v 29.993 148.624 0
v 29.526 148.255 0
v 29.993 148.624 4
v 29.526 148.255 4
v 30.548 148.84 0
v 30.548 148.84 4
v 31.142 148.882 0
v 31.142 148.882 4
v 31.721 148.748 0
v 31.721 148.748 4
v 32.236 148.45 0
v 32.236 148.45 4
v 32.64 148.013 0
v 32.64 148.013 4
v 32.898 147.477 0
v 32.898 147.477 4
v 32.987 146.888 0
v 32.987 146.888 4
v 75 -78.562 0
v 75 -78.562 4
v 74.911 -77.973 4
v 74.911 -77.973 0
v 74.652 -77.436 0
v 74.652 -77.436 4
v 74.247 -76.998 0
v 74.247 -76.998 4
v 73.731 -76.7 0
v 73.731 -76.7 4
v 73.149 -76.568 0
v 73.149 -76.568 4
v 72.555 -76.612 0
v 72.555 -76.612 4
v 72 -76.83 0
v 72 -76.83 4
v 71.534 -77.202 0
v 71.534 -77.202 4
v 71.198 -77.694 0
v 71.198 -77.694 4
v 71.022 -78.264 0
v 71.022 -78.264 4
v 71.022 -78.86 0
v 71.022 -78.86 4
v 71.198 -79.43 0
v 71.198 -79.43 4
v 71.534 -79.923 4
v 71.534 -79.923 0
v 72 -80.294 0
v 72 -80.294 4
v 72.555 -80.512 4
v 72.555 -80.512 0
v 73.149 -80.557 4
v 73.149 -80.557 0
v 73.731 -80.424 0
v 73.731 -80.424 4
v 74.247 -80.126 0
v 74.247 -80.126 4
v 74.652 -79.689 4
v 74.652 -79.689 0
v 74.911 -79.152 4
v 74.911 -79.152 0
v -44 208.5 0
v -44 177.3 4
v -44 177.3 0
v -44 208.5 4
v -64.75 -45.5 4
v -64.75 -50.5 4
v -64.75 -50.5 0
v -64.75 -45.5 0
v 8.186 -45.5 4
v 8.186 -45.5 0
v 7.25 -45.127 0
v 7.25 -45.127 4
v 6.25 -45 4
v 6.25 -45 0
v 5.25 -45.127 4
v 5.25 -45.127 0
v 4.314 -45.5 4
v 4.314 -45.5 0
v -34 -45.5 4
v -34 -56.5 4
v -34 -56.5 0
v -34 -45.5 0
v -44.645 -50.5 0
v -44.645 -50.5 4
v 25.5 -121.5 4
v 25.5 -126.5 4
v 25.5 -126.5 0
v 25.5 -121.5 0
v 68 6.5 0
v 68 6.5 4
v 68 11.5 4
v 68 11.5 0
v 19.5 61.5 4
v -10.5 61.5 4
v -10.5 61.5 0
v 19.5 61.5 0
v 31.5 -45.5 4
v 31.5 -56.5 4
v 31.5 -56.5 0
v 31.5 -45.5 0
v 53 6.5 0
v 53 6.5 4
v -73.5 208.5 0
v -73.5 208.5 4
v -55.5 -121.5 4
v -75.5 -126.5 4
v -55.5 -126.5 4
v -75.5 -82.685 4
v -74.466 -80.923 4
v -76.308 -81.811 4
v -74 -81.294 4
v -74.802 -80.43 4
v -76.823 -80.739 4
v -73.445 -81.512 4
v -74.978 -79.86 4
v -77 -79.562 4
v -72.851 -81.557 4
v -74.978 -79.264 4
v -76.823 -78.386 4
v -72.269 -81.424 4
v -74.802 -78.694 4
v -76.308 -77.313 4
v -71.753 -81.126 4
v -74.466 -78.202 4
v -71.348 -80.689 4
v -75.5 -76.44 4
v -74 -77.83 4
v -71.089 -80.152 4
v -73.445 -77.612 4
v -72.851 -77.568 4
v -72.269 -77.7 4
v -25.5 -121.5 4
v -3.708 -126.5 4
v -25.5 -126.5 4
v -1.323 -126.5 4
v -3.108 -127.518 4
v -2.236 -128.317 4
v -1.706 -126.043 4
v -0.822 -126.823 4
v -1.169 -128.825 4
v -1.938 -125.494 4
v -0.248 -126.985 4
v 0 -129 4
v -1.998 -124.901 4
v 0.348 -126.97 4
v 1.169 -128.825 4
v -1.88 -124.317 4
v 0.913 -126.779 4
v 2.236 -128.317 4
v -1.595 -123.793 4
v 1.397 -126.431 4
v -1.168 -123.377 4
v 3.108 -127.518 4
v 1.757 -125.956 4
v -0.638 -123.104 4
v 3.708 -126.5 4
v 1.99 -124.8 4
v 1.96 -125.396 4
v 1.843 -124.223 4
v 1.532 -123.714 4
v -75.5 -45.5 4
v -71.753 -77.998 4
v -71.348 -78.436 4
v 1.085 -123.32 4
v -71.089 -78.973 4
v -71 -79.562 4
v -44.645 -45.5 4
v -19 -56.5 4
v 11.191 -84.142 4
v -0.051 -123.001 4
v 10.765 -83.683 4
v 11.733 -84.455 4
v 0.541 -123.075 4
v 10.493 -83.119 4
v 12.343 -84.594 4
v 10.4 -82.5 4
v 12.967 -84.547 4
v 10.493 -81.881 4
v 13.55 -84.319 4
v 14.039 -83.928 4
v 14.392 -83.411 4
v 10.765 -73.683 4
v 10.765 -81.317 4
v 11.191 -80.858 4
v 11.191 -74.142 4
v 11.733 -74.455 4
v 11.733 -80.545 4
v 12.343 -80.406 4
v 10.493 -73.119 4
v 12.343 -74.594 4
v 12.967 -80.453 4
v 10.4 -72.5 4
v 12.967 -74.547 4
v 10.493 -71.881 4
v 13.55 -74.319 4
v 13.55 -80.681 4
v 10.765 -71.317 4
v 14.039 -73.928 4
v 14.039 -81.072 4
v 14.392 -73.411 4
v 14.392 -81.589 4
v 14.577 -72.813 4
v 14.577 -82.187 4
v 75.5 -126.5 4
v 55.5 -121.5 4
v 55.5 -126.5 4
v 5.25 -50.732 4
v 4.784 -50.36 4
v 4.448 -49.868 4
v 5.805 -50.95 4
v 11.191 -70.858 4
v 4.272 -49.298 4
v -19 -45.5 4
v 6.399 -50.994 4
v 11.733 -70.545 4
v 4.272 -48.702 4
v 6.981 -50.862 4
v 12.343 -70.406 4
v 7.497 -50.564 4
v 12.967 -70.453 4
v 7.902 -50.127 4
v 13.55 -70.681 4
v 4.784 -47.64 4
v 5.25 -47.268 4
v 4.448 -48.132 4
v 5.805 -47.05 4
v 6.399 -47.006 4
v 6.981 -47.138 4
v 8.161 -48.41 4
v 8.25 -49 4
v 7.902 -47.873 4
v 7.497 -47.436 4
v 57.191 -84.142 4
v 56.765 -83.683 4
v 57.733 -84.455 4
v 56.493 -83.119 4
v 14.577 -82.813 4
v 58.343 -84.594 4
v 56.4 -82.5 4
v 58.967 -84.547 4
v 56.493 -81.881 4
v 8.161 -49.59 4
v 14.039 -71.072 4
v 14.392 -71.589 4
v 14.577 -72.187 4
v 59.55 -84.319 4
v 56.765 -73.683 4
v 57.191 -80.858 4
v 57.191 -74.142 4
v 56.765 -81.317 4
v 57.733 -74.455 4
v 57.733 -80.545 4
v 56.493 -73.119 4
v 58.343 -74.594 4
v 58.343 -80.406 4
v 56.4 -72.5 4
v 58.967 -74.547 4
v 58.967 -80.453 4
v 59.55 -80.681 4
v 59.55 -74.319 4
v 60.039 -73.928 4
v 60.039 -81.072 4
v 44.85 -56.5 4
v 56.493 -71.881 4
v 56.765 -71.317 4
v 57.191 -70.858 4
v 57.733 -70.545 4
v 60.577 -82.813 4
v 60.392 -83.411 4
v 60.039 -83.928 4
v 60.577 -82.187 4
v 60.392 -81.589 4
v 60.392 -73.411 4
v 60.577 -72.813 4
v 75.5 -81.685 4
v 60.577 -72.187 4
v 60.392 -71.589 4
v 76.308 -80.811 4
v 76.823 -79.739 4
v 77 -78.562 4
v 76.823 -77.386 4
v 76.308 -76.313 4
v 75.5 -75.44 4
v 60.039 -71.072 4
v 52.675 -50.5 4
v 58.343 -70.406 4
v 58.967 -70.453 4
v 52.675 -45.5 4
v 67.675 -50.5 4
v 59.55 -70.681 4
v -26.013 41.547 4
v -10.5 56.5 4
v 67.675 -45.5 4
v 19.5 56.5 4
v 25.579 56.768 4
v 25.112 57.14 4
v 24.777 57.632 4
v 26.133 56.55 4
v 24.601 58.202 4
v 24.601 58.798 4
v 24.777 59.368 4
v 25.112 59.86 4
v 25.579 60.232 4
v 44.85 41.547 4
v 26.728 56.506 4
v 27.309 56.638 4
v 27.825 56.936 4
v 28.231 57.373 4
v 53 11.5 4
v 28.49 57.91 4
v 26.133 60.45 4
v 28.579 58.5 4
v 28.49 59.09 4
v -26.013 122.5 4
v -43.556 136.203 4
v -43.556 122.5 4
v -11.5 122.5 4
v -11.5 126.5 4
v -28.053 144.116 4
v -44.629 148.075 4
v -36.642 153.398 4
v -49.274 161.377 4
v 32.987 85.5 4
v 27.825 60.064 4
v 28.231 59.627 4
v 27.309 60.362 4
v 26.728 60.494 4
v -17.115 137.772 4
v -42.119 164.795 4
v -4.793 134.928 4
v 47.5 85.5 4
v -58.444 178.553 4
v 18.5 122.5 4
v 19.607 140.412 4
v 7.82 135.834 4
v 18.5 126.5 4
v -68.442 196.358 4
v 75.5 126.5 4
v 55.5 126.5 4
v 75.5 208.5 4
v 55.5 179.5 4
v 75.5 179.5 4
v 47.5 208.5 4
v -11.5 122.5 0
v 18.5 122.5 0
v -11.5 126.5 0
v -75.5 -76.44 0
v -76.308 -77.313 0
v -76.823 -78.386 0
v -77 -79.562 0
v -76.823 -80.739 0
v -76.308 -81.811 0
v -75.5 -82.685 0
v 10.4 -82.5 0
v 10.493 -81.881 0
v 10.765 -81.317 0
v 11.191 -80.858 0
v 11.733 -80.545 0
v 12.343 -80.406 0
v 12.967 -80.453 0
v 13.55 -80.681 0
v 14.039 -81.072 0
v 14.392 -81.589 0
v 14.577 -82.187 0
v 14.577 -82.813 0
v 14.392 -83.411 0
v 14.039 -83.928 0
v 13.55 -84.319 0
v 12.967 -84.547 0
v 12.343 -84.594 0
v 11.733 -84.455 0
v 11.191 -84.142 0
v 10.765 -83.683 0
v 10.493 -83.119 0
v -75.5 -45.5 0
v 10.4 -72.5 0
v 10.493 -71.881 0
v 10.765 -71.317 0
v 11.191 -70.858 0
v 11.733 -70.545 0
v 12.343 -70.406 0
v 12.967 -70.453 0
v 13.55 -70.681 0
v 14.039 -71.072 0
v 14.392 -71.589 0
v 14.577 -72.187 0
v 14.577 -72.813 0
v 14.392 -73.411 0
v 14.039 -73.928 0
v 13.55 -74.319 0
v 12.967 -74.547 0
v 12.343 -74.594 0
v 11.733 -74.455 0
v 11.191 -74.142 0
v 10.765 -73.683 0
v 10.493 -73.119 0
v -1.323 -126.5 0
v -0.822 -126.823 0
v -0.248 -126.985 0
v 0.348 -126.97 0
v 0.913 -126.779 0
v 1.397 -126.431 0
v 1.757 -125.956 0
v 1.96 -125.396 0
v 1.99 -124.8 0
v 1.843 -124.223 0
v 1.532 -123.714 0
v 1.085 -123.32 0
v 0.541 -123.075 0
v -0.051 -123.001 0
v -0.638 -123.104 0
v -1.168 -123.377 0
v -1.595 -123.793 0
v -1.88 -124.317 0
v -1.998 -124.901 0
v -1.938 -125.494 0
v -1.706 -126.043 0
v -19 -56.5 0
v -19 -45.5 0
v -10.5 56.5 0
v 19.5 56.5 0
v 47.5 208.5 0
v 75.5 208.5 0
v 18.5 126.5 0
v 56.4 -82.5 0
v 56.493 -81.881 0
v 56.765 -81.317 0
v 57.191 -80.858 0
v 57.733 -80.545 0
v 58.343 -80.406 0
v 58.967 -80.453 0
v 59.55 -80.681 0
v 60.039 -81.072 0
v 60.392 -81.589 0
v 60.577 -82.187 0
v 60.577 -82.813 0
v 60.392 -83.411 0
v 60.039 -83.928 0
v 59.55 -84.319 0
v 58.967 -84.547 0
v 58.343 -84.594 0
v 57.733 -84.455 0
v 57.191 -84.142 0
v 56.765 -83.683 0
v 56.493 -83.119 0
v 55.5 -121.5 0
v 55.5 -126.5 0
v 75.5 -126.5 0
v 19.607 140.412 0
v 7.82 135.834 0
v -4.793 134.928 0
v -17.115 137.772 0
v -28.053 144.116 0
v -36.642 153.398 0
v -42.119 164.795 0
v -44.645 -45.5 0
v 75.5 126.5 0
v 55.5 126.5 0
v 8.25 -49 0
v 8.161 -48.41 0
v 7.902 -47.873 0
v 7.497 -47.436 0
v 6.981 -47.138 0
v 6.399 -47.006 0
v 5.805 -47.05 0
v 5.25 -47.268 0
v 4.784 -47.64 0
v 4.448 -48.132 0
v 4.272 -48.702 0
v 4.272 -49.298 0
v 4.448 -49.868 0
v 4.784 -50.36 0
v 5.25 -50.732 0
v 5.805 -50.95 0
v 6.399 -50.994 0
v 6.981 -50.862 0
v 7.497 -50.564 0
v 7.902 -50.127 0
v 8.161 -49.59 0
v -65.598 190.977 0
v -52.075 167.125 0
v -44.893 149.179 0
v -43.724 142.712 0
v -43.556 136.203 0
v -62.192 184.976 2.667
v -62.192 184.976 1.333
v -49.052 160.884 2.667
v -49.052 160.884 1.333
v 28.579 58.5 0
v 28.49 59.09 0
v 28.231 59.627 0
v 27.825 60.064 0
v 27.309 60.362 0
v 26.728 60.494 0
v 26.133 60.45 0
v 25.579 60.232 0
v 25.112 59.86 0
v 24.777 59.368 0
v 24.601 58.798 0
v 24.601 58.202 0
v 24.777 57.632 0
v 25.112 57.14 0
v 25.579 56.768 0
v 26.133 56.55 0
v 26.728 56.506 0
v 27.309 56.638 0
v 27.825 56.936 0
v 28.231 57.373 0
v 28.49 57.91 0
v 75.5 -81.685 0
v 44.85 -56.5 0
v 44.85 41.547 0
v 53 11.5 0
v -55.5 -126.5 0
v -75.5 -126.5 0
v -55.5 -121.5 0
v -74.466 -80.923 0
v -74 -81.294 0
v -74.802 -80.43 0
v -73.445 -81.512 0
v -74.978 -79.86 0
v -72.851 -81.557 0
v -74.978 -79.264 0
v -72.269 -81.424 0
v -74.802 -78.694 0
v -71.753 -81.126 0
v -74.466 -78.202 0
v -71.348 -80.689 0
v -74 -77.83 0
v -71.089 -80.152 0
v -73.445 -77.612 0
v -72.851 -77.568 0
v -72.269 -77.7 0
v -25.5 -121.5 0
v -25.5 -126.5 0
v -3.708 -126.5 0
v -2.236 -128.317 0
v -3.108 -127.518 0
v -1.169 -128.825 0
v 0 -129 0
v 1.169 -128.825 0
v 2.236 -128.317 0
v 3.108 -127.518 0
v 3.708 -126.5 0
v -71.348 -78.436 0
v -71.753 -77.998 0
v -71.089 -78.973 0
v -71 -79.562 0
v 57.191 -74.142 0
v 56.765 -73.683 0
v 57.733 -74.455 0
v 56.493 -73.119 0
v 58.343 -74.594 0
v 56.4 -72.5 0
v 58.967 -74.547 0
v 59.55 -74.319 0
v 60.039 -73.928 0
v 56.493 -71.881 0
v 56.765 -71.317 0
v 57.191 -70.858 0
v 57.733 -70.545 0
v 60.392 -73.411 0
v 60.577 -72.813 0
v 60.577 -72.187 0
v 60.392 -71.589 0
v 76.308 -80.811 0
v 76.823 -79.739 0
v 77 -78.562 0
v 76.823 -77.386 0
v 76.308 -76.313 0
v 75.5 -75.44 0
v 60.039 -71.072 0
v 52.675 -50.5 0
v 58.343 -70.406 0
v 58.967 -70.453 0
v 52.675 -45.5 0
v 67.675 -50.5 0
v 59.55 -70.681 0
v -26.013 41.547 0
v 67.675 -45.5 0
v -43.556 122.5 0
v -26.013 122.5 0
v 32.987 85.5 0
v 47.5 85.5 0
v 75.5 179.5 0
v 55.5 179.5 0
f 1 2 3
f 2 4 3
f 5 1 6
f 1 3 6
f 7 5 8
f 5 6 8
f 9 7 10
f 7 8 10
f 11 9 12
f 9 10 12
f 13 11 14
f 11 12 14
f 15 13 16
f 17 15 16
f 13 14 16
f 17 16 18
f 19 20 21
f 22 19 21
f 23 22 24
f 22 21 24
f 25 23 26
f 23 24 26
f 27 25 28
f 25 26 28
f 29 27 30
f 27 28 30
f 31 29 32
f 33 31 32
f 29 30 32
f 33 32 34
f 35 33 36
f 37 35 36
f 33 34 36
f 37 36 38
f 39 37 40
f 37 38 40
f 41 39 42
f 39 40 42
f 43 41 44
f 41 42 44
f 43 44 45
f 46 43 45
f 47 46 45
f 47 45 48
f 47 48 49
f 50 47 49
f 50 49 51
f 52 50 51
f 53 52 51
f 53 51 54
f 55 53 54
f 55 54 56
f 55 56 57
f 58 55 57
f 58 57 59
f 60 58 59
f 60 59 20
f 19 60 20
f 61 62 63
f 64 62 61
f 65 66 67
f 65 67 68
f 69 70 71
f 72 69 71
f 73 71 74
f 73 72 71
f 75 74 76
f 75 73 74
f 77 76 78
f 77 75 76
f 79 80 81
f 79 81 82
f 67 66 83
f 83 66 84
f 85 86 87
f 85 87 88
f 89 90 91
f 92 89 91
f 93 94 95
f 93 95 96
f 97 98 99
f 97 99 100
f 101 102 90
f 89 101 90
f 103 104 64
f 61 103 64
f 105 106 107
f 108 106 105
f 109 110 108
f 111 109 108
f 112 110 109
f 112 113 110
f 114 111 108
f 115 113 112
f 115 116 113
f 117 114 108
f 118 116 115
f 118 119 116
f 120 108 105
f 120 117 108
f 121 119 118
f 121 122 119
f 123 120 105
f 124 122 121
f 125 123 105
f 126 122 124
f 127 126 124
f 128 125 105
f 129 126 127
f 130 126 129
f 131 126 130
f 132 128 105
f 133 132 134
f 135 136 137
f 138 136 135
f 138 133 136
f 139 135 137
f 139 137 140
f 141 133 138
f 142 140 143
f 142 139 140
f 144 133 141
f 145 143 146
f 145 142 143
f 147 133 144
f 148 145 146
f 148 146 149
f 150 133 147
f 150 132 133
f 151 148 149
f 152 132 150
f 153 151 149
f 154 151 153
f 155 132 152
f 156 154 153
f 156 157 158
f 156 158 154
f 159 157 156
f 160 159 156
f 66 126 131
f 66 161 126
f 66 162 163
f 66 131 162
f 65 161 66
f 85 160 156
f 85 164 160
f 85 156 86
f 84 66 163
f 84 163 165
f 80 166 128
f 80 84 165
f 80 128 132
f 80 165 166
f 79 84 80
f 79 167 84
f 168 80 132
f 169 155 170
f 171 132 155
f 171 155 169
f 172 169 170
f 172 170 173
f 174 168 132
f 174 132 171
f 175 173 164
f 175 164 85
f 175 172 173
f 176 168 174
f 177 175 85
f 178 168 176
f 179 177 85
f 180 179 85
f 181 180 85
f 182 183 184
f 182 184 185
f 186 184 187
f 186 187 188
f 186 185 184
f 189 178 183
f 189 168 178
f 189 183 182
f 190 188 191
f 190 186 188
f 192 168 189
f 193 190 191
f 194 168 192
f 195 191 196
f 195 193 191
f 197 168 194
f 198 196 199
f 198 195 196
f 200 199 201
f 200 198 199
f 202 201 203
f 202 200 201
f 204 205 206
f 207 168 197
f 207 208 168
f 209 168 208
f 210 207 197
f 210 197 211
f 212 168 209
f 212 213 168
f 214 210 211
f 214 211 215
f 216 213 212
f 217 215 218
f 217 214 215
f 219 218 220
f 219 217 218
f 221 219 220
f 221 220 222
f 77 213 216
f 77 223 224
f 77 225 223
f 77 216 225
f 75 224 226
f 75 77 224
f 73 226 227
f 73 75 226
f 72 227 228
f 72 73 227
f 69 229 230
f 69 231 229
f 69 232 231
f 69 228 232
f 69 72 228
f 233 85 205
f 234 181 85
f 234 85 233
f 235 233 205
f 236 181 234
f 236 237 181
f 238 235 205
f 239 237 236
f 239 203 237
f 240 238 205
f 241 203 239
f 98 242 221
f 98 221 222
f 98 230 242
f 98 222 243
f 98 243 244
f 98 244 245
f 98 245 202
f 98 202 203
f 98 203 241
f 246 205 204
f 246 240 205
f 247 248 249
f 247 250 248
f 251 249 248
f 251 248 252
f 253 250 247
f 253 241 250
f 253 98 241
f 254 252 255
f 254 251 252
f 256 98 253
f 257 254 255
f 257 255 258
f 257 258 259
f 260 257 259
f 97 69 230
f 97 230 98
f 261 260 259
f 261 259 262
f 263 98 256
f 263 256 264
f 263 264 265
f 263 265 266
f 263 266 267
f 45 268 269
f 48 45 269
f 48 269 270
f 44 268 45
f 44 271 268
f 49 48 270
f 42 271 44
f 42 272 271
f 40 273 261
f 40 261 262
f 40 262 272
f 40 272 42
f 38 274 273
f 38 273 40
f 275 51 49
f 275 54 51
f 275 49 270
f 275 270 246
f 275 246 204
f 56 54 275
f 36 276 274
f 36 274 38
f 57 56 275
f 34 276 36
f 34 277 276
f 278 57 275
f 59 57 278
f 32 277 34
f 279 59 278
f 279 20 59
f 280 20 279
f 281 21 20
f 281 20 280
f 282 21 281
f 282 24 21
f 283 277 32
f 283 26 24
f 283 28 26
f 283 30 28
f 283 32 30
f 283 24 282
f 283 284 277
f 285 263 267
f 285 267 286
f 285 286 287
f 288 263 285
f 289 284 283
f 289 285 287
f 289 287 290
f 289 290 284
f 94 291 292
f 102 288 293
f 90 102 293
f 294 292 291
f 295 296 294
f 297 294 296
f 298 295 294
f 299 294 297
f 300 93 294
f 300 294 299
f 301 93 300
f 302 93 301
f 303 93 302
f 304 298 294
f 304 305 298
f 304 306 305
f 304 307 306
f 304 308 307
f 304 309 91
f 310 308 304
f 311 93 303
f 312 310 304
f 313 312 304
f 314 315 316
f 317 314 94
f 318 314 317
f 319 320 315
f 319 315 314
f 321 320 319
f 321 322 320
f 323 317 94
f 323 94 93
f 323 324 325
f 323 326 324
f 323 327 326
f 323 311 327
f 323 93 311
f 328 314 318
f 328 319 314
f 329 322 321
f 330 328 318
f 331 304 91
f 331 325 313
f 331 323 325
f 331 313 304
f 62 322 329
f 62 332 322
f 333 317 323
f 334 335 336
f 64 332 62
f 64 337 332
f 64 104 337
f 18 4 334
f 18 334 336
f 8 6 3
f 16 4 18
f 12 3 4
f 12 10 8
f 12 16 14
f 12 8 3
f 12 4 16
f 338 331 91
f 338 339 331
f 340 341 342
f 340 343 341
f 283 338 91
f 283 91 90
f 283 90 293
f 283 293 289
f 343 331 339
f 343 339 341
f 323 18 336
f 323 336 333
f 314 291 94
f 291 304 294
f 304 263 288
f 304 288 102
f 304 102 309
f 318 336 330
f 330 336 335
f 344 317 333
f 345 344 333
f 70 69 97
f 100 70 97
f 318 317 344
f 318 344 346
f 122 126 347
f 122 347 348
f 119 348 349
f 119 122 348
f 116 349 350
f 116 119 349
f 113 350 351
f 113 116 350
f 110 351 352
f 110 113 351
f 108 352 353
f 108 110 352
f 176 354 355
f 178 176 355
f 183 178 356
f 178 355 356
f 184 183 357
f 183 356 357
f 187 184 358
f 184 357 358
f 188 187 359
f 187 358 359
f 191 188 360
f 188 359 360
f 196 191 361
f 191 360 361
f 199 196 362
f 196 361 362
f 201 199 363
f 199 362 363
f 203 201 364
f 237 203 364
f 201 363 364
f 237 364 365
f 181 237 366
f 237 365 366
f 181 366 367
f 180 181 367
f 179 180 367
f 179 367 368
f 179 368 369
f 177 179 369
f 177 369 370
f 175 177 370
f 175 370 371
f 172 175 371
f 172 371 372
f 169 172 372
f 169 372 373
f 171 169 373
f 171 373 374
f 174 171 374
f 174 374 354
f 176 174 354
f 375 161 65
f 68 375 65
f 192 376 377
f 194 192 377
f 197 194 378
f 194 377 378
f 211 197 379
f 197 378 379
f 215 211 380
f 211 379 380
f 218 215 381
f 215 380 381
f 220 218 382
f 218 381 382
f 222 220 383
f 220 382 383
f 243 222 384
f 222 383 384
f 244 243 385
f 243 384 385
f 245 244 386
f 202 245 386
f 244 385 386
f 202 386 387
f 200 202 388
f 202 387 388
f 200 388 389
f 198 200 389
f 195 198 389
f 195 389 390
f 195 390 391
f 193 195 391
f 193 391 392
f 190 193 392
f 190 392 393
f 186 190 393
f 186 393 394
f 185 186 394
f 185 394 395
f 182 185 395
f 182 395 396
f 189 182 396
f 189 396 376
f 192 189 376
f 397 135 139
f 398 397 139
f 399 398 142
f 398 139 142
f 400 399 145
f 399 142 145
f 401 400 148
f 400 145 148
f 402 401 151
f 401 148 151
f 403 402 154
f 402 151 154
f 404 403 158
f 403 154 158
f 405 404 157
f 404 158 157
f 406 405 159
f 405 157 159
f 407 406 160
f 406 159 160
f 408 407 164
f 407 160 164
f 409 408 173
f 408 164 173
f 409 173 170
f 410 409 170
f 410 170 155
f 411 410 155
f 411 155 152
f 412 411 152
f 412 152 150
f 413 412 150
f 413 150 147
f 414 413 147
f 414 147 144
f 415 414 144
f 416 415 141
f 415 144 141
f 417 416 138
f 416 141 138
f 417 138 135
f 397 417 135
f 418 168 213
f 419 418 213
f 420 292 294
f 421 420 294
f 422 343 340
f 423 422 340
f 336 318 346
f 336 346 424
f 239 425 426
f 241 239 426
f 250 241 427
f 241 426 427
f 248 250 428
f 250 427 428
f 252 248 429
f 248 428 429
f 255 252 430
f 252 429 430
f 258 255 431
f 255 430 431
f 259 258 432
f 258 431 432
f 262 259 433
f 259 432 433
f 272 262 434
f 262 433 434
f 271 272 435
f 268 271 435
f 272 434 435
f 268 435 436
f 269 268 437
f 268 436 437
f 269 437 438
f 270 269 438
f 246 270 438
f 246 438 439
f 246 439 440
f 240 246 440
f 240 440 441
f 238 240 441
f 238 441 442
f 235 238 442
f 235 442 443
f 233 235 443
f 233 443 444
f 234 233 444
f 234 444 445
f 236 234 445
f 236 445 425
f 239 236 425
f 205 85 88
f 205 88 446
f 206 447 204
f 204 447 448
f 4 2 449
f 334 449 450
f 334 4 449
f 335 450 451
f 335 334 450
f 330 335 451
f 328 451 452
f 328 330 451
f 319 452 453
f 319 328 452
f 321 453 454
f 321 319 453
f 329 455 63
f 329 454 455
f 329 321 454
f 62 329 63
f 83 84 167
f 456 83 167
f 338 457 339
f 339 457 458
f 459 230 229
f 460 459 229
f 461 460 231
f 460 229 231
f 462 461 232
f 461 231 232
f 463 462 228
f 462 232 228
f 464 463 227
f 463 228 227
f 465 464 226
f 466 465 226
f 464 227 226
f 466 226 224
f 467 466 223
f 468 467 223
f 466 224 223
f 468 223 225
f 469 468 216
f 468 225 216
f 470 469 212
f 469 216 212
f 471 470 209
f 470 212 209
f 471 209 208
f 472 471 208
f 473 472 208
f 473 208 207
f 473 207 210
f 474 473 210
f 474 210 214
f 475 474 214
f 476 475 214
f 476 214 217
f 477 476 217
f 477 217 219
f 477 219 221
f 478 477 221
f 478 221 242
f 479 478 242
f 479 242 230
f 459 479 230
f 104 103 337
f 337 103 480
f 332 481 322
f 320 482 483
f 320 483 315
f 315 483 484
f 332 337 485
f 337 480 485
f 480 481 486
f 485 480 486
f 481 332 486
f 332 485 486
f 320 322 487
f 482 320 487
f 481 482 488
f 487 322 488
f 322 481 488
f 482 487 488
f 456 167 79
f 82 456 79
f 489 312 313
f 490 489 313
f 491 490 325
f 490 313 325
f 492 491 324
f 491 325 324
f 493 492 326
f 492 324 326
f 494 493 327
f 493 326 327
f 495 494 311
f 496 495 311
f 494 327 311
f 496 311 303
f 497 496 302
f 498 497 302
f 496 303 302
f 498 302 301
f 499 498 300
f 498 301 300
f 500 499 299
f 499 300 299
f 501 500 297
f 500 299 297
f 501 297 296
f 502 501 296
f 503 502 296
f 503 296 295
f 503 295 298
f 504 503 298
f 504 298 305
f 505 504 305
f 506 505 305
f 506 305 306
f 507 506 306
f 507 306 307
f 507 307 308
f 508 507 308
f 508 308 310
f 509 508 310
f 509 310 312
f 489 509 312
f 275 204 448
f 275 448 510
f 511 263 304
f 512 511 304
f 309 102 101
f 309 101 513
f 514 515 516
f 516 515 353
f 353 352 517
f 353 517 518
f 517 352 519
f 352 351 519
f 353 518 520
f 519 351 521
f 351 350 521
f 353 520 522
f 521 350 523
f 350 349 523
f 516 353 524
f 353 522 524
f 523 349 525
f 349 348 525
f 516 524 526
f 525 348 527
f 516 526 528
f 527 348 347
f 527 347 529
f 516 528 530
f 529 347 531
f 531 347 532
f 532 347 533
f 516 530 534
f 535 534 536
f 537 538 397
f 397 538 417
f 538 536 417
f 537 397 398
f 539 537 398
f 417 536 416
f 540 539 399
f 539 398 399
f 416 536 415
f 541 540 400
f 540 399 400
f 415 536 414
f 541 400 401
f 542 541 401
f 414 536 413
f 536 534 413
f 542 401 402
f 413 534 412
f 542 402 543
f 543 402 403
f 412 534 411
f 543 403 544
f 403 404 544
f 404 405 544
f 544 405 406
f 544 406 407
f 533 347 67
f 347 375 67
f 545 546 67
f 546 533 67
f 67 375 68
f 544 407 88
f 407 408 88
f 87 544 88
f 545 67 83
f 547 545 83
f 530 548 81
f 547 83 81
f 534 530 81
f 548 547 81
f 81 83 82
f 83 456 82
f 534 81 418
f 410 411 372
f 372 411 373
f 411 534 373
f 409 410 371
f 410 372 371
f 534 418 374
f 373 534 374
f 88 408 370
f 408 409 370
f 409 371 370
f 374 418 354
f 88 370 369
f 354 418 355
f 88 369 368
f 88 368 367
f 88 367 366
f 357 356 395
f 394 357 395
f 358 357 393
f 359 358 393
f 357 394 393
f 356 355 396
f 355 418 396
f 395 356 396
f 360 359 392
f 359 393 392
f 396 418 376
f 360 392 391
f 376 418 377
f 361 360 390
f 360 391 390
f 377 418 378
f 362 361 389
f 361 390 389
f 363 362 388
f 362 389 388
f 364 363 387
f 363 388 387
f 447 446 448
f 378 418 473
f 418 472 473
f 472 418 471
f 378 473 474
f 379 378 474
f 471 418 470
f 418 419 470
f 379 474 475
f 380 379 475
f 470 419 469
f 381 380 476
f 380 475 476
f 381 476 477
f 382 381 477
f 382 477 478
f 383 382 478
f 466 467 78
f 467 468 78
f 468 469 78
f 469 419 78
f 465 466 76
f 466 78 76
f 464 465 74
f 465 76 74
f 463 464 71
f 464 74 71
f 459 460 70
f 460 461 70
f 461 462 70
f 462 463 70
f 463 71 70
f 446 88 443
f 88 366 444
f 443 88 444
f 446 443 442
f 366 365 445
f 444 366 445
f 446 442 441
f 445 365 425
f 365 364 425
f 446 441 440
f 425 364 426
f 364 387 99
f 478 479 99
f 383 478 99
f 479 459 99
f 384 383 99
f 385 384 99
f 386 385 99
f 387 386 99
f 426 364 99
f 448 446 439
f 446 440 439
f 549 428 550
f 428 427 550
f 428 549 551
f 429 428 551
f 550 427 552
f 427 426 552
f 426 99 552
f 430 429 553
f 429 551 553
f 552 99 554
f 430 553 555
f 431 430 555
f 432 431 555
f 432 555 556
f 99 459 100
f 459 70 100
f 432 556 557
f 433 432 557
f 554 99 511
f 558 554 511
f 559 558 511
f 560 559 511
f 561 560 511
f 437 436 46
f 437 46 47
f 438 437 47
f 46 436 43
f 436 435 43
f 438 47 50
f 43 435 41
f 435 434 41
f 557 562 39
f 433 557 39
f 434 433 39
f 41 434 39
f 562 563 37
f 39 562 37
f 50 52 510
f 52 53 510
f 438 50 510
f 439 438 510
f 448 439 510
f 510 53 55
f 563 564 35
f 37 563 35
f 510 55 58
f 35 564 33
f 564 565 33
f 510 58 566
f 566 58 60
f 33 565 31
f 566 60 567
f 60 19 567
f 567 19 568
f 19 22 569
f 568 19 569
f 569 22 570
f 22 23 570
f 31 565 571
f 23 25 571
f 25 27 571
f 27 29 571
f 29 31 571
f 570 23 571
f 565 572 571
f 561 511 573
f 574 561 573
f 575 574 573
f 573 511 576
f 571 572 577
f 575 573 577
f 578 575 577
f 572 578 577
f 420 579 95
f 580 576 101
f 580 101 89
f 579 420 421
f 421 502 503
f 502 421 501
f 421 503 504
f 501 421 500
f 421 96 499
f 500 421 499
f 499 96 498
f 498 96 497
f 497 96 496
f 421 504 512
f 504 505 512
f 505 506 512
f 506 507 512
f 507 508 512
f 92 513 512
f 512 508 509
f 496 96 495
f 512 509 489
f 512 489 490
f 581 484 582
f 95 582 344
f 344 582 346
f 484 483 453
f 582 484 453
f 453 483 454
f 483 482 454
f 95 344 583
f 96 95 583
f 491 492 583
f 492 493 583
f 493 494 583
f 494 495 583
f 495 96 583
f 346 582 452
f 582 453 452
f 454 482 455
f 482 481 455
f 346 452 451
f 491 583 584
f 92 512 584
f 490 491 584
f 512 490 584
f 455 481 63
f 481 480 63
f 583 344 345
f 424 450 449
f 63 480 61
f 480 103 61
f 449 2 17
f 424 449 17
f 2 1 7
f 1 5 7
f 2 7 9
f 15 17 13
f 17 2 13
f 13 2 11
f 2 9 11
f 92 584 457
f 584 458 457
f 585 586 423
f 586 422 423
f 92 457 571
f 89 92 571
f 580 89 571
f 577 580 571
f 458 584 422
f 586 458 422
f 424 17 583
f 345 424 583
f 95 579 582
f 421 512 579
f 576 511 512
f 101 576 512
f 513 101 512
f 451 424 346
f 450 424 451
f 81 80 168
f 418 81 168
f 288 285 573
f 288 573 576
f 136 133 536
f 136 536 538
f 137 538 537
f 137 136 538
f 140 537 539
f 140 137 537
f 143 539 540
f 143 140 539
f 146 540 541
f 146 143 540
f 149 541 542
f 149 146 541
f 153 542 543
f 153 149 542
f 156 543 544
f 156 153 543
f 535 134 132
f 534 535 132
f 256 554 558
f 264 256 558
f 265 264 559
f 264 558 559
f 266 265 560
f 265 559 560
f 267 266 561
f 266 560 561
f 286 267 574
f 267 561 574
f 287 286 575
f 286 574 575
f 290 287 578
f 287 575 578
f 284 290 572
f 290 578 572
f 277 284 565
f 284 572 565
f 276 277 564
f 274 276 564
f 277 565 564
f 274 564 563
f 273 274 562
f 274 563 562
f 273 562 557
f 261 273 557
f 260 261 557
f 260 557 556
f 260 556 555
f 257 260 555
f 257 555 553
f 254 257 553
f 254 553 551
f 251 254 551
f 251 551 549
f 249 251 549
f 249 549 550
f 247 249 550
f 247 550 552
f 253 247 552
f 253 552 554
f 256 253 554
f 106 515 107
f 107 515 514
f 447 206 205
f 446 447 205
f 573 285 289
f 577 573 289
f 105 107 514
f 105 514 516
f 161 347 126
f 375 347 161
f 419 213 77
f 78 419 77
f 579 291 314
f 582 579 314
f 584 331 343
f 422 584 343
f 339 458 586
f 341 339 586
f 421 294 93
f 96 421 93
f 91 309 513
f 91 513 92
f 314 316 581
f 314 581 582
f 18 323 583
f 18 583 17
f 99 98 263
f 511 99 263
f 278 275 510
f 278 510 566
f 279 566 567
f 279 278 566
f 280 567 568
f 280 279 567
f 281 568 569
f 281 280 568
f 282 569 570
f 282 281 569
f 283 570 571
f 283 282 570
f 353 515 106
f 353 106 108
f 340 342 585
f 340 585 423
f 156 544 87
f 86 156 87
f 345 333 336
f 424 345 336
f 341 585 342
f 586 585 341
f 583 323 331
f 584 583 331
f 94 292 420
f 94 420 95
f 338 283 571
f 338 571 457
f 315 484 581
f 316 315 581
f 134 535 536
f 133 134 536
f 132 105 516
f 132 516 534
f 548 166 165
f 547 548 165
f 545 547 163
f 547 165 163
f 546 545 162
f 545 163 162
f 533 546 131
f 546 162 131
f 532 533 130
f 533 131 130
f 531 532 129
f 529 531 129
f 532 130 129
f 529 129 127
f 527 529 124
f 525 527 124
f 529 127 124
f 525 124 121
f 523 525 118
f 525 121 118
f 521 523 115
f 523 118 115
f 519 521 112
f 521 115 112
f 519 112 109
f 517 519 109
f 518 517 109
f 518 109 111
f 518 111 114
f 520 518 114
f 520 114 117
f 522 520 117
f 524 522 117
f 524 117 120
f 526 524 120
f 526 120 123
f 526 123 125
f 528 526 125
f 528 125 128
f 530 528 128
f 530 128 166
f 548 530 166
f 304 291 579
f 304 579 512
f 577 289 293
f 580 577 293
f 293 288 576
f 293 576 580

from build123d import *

# Parameters (mm, degrees)
SKETCH1_W           = 151
SKETCH1_H           = 254
BOSS_EXTRUDE1_DEPTH = 4
SKETCH2_W           = 49.486524855
SKETCH2_H           = 99.222786378
CUT_EXTRUDE1_DEPTH  = 5
SKETCH4_W           = 120.35
SKETCH4_H           = 88.04721362
CUT_EXTRUDE3_DEPTH  = 5
SKETCH6_R           = 2
CUT_EXTRUDE5_DEPTH  = 10
SKETCH12_W          = 15
SKETCH12_H          = 10
SKETCH12_W_2        = 13.35
CUT_EXTRUDE8_DEPTH  = 10
SKETCH13_R          = 2
CUT_EXTRUDE9_DEPTH  = 5
SKETCH14_R          = 4
SKETCH14_R_2        = 2
BOSS_EXTRUDE2_DEPTH = 4
SKETCH15_R          = 2.1
CUT_EXTRUDE10_DEPTH = 10
SKETCH18_R          = 2
CUT_EXTRUDE12_DEPTH = 5
SKETCH19_R          = 4
SKETCH19_R_2        = 2
BOSS_EXTRUDE3_DEPTH = 4
SKETCH25_W          = 59.513475145
SKETCH25_H          = 4
CUT_EXTRUDE16_DEPTH = 10
SKETCH26_W          = 151
SKETCH26_H          = 86
BOSS_EXTRUDE4_DEPTH = 4
SKETCH27_W          = 42
SKETCH27_H          = 62
BOSS_EXTRUDE5_DEPTH = 4
CUT_EXTRUDE17_DEPTH = 5
SKETCH29_W          = 20
SKETCH29_H          = 53
CUT_EXTRUDE18_DEPTH = 10
SKETCH30_W          = 14.513475145
SKETCH30_H          = 123
CUT_EXTRUDE19_DEPTH = 10
CUT_EXTRUDE20_DEPTH = 10
FILLET1_R           = 2
SKETCH33_W          = 30
SKETCH33_H          = 4
CUT_EXTRUDE22_DEPTH = 10
SKETCH34_W          = 30
SKETCH34_H          = 5
SKETCH34_W_2        = 15
CUT_EXTRUDE23_DEPTH = 10
SKETCH35_W          = 50.5
SKETCH35_H          = 0.999999998
SKETCH35_W_2        = 41.5
BOSS_EXTRUDE6_DEPTH = 4
SKETCH36_W          = 20.104648663
SKETCH36_H          = 5
CUT_EXTRUDE24_DEPTH = 5
SKETCH37_R          = 2
CUT_EXTRUDE25_DEPTH = 5
SKETCH38_R          = 4
SKETCH38_R_2        = 2
BOSS_EXTRUDE7_DEPTH = 4
SKETCH39_R          = 2
CUT_EXTRUDE26_DEPTH = 10


with BuildPart() as part:
    # Sketch1 → Boss-Extrude1 (new body)
    with BuildSketch(Plane.XY):
        with Locations((0, 0.5)):
            Rectangle(SKETCH1_W, SKETCH1_H)
    extrude(amount=BOSS_EXTRUDE1_DEPTH)

    # Sketch2 → Cut-Extrude1 (cut)
    with BuildSketch(Plane.XY.offset(4)):
        with Locations((-50.756737573, 77.888606811)):
            Rectangle(SKETCH2_W, SKETCH2_H)
    extrude(amount=-CUT_EXTRUDE1_DEPTH, mode=Mode.SUBTRACT)

    # Sketch4 → Cut-Extrude3 (cut)
    with BuildSketch(Plane.XY.offset(4)):
        with Locations((-15.325, -2.476393188)):
            Rectangle(SKETCH4_W, SKETCH4_H)
    extrude(amount=-CUT_EXTRUDE3_DEPTH, mode=Mode.SUBTRACT)

    # Sketch6 → Cut-Extrude5 (cut)
    with BuildSketch(Plane.XY.offset(4)):
        with Locations((0, -125)):
            Circle(SKETCH6_R)
    extrude(amount=-CUT_EXTRUDE5_DEPTH, mode=Mode.SUBTRACT)

    # Sketch12 → Cut-Extrude8 (cut)
    with BuildSketch(Plane.XY.offset(4)):
        with Locations((-26.5, -51.499999998)):
            Rectangle(SKETCH12_W, SKETCH12_H)
        with Locations((38.175, -51.499999998)):
            Rectangle(SKETCH12_W_2, SKETCH12_H)
    extrude(amount=-CUT_EXTRUDE8_DEPTH, mode=Mode.SUBTRACT)

    # Sketch13 → Cut-Extrude9 (cut)
    with BuildSketch(Plane.XY.offset(4)):
        with Locations((6.25, -49)):
            Circle(SKETCH13_R)
    extrude(amount=-CUT_EXTRUDE9_DEPTH, mode=Mode.SUBTRACT)

    # Sketch14 → Boss-Extrude2 (add)
    # profile 1 of 2: a face of its own
    with BuildSketch(Plane.XY.offset(4)):
        with Locations((6.25, -49)):
            Circle(SKETCH14_R)
        with Locations((6.25, -49)):
            Circle(SKETCH14_R_2, mode=Mode.SUBTRACT)
    # profile 2 of 2: a face of its own
    with BuildSketch(Plane.XY.offset(4)):
        with Locations((0, -125)):
            Circle(SKETCH14_R)
        with Locations((0, -125)):
            Circle(SKETCH14_R_2, mode=Mode.SUBTRACT)
    extrude(amount=-BOSS_EXTRUDE2_DEPTH)

    # Sketch15 → Cut-Extrude10 (cut)
    with BuildSketch(Plane(origin=(0, 0, 0), x_dir=(-1, 0, 0), z_dir=(0, 0, -1))):
        with Locations((-58.5, -72.5)):
            Circle(SKETCH15_R)
        with Locations((-58.5, -82.5)):
            Circle(SKETCH15_R)
        with Locations((-12.5, -72.5)):
            Circle(SKETCH15_R)
        with Locations((-12.5, -82.5)):
            Circle(SKETCH15_R)
    extrude(amount=-CUT_EXTRUDE10_DEPTH, mode=Mode.SUBTRACT)

    # Sketch18 → Cut-Extrude12 (cut)
    with BuildSketch(Plane.XY.offset(4)):
        with Locations((-73, -79.562158061)):
            Circle(SKETCH18_R)
    extrude(amount=-CUT_EXTRUDE12_DEPTH, mode=Mode.SUBTRACT)

    # Sketch19 → Boss-Extrude3 (add)
    with BuildSketch(Plane.XY.offset(4)):
        with Locations((-73, -79.562158061)):
            Circle(SKETCH19_R)
        with Locations((-73, -79.562158061)):
            Circle(SKETCH19_R_2, mode=Mode.SUBTRACT)
    extrude(amount=-BOSS_EXTRUDE3_DEPTH)

    # Sketch25 → Cut-Extrude16 (cut)
    with BuildSketch(Plane.XY.offset(4)):
        with Locations((3.743262427, 124.5)):
            Rectangle(SKETCH25_W, SKETCH25_H)
    extrude(amount=-CUT_EXTRUDE16_DEPTH, mode=Mode.SUBTRACT)

    # Sketch26 → Boss-Extrude4 (add)
    with BuildSketch(Plane.XY.offset(4)):
        with Locations((0, 165.5)):
            Rectangle(SKETCH26_W, SKETCH26_H)
    extrude(amount=-BOSS_EXTRUDE4_DEPTH)

    # Sketch27 → Boss-Extrude5 (add)
    with BuildSketch(Plane.XY.offset(4)):
        with Locations((54.5, 91.5)):
            Rectangle(SKETCH27_W, SKETCH27_H)
    extrude(amount=-BOSS_EXTRUDE5_DEPTH)

    # Sketch28 → Cut-Extrude17 (cut)
    with BuildSketch(Plane(origin=(0, 0, 0), x_dir=(-1, 0, 0), z_dir=(0, 0, -1))):
        with BuildLine():
            Line((43.55584756, 136.203397333), (43.55584756, 122.5))
            Line((43.55584756, 122.5), (75.5, 122.5))
            Line((75.5, 122.5), (75.5, 208.5))
            Line((75.5, 208.5), (73.5, 208.5))
            add(Edge.make_bspline(
                [(73.5, 208.5), (66.265840294, 185.251616354), (42.071208011, 161.186737721), (43.55584756, 136.203397333)],
                knots=[0, 0, 0, 0, 0.885856011, 0.885856011, 0.885856011, 0.885856011], degree=3))
        make_face()
    extrude(amount=-CUT_EXTRUDE17_DEPTH, mode=Mode.SUBTRACT)

    # Sketch29 → Cut-Extrude18 (cut)
    with BuildSketch(Plane(origin=(0, 0, 0), x_dir=(-1, 0, 0), z_dir=(0, 0, -1))):
        with Locations((-65.5, 153)):
            Rectangle(SKETCH29_W, SKETCH29_H)
    extrude(amount=-CUT_EXTRUDE18_DEPTH, mode=Mode.SUBTRACT)

    # Sketch30 → Cut-Extrude19 (cut)
    with BuildSketch(Plane.XY.offset(4)):
        with Locations((40.243262427, 147)):
            Rectangle(SKETCH30_W, SKETCH30_H)
    extrude(amount=-CUT_EXTRUDE19_DEPTH, mode=Mode.SUBTRACT)

    # Sketch31 → Cut-Extrude20 (cut)
    with BuildSketch(Plane.XY.offset(4)):
        with BuildLine():
            Line((-44, 177.3), (-44, 208.5))
            Line((-44, 208.5), (41, 208.5))
            Line((41, 208.5), (41, 177.3))
            ThreePointArc((41, 177.3), (-1.5, 134.8), (-44, 177.3))
        make_face()
    extrude(amount=-CUT_EXTRUDE20_DEPTH, mode=Mode.SUBTRACT)

    # Fillet1
    fillet1_edges = [part.edges().sort_by_distance(p)[0] for p in [
        (32.986524855, 152.461932373, 2),
    ]]
    fillet(fillet1_edges, radius=FILLET1_R)

    # Sketch33 → Cut-Extrude22 (cut)
    with BuildSketch(Plane.XY.offset(4)):
        with Locations((3.5, 124.5)):
            Rectangle(SKETCH33_W, SKETCH33_H)
    extrude(amount=-CUT_EXTRUDE22_DEPTH, mode=Mode.SUBTRACT)

    # Sketch34 → Cut-Extrude23 (cut)
    with BuildSketch(Plane.XY.offset(4)):
        with Locations((40.5, -124)):
            Rectangle(SKETCH34_W, SKETCH34_H)
        with Locations((-40.5, -124)):
            Rectangle(SKETCH34_W, SKETCH34_H)
        with Locations((60.175, -48)):
            Rectangle(SKETCH34_W_2, SKETCH34_H)
        with Locations((60.5, 9)):
            Rectangle(SKETCH34_W_2, SKETCH34_H)
        with Locations((4.5, 59)):
            Rectangle(SKETCH34_W, SKETCH34_H)
    extrude(amount=-CUT_EXTRUDE23_DEPTH, mode=Mode.SUBTRACT)

    # Sketch35 → Boss-Extrude6 (add)
    with BuildSketch(Plane.XY.offset(4)):
        with Locations((6.25, -45.999999999)):
            Rectangle(SKETCH35_W, SKETCH35_H)
        with Locations((-54.75, -45.999999999)):
            Rectangle(SKETCH35_W_2, SKETCH35_H)
    extrude(amount=-BOSS_EXTRUDE6_DEPTH)

    # Sketch36 → Cut-Extrude24 (cut)
    with BuildSketch(Plane.XY.offset(4)):
        with Locations((-54.697675668, -48)):
            Rectangle(SKETCH36_W, SKETCH36_H)
    extrude(amount=-CUT_EXTRUDE24_DEPTH, mode=Mode.SUBTRACT)

    # Sketch37 → Cut-Extrude25 (cut)
    with BuildSketch(Plane.XY.offset(4)):
        with Locations((73, -78.562158061)):
            Circle(SKETCH37_R)
    extrude(amount=-CUT_EXTRUDE25_DEPTH, mode=Mode.SUBTRACT)

    # Sketch38 → Boss-Extrude7 (add)
    with BuildSketch(Plane.XY.offset(4)):
        with Locations((73, -78.562158061)):
            Circle(SKETCH38_R)
        with Locations((73, -78.562158061)):
            Circle(SKETCH38_R_2, mode=Mode.SUBTRACT)
    extrude(amount=-BOSS_EXTRUDE7_DEPTH)

    # Sketch39 → Cut-Extrude26 (cut)
    with BuildSketch(Plane.XY.offset(4)):
        with Locations((26.57851787, 58.5)):
            Circle(SKETCH39_R)
    extrude(amount=-CUT_EXTRUDE26_DEPTH, mode=Mode.SUBTRACT)


solid = part.part
